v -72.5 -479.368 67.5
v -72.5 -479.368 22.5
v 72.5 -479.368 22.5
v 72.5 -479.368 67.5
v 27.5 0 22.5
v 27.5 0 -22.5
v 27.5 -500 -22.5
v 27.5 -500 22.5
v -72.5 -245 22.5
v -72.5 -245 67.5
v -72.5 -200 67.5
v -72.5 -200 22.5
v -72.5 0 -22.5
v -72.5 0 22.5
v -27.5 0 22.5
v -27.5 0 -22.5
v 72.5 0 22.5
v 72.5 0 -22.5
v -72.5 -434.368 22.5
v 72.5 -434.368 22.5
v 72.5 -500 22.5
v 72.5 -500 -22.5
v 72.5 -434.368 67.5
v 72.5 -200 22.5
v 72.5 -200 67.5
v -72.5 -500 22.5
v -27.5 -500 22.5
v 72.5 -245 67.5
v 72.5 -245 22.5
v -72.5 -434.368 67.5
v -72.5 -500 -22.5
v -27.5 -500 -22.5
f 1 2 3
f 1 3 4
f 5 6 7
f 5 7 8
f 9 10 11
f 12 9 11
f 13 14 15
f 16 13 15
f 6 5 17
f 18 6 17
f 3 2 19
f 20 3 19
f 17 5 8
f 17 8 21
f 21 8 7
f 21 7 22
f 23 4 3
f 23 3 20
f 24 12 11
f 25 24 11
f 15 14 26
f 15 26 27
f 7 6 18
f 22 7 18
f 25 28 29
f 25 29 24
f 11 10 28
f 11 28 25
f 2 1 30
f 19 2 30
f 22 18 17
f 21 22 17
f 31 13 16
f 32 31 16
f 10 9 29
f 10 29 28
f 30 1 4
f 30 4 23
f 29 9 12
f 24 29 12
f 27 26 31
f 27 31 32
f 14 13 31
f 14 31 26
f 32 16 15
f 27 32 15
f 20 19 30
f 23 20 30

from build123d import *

# Parameters (mm, degrees)
F0_W     = 45
F0_H     = 45
F1_DEPTH = 500
F2_W     = 45
F2_H     = 45
F3_DEPTH = 145
F4_W     = 45
F4_H     = 45
F5_DEPTH = 145


with BuildPart() as f1:
    # F0 (on Front) → F1 (new body)
    with BuildSketch(Plane.XZ):
        with Locations((50, 0)):
            Rectangle(F0_W, F0_H)
        with Locations((-50, 0)):
            Rectangle(F0_W, F0_H)
    extrude(amount=F1_DEPTH)


with BuildPart() as f3:
    # F2 (on face) → F3 (new body)
    with BuildSketch(Plane.YZ.offset(72.5)):
        with Locations((-222.5, 45)):
            Rectangle(F2_W, F2_H)
    extrude(amount=-F3_DEPTH)


with BuildPart() as f5:
    # F4 (on face) → F5 (new body)
    with BuildSketch(Plane.YZ.offset(72.5)):
        with Locations((-456.868402, 45)):
            Rectangle(F4_W, F4_H)
    extrude(amount=-F5_DEPTH)


solid = Compound([f1.part, f3.part, f5.part])
